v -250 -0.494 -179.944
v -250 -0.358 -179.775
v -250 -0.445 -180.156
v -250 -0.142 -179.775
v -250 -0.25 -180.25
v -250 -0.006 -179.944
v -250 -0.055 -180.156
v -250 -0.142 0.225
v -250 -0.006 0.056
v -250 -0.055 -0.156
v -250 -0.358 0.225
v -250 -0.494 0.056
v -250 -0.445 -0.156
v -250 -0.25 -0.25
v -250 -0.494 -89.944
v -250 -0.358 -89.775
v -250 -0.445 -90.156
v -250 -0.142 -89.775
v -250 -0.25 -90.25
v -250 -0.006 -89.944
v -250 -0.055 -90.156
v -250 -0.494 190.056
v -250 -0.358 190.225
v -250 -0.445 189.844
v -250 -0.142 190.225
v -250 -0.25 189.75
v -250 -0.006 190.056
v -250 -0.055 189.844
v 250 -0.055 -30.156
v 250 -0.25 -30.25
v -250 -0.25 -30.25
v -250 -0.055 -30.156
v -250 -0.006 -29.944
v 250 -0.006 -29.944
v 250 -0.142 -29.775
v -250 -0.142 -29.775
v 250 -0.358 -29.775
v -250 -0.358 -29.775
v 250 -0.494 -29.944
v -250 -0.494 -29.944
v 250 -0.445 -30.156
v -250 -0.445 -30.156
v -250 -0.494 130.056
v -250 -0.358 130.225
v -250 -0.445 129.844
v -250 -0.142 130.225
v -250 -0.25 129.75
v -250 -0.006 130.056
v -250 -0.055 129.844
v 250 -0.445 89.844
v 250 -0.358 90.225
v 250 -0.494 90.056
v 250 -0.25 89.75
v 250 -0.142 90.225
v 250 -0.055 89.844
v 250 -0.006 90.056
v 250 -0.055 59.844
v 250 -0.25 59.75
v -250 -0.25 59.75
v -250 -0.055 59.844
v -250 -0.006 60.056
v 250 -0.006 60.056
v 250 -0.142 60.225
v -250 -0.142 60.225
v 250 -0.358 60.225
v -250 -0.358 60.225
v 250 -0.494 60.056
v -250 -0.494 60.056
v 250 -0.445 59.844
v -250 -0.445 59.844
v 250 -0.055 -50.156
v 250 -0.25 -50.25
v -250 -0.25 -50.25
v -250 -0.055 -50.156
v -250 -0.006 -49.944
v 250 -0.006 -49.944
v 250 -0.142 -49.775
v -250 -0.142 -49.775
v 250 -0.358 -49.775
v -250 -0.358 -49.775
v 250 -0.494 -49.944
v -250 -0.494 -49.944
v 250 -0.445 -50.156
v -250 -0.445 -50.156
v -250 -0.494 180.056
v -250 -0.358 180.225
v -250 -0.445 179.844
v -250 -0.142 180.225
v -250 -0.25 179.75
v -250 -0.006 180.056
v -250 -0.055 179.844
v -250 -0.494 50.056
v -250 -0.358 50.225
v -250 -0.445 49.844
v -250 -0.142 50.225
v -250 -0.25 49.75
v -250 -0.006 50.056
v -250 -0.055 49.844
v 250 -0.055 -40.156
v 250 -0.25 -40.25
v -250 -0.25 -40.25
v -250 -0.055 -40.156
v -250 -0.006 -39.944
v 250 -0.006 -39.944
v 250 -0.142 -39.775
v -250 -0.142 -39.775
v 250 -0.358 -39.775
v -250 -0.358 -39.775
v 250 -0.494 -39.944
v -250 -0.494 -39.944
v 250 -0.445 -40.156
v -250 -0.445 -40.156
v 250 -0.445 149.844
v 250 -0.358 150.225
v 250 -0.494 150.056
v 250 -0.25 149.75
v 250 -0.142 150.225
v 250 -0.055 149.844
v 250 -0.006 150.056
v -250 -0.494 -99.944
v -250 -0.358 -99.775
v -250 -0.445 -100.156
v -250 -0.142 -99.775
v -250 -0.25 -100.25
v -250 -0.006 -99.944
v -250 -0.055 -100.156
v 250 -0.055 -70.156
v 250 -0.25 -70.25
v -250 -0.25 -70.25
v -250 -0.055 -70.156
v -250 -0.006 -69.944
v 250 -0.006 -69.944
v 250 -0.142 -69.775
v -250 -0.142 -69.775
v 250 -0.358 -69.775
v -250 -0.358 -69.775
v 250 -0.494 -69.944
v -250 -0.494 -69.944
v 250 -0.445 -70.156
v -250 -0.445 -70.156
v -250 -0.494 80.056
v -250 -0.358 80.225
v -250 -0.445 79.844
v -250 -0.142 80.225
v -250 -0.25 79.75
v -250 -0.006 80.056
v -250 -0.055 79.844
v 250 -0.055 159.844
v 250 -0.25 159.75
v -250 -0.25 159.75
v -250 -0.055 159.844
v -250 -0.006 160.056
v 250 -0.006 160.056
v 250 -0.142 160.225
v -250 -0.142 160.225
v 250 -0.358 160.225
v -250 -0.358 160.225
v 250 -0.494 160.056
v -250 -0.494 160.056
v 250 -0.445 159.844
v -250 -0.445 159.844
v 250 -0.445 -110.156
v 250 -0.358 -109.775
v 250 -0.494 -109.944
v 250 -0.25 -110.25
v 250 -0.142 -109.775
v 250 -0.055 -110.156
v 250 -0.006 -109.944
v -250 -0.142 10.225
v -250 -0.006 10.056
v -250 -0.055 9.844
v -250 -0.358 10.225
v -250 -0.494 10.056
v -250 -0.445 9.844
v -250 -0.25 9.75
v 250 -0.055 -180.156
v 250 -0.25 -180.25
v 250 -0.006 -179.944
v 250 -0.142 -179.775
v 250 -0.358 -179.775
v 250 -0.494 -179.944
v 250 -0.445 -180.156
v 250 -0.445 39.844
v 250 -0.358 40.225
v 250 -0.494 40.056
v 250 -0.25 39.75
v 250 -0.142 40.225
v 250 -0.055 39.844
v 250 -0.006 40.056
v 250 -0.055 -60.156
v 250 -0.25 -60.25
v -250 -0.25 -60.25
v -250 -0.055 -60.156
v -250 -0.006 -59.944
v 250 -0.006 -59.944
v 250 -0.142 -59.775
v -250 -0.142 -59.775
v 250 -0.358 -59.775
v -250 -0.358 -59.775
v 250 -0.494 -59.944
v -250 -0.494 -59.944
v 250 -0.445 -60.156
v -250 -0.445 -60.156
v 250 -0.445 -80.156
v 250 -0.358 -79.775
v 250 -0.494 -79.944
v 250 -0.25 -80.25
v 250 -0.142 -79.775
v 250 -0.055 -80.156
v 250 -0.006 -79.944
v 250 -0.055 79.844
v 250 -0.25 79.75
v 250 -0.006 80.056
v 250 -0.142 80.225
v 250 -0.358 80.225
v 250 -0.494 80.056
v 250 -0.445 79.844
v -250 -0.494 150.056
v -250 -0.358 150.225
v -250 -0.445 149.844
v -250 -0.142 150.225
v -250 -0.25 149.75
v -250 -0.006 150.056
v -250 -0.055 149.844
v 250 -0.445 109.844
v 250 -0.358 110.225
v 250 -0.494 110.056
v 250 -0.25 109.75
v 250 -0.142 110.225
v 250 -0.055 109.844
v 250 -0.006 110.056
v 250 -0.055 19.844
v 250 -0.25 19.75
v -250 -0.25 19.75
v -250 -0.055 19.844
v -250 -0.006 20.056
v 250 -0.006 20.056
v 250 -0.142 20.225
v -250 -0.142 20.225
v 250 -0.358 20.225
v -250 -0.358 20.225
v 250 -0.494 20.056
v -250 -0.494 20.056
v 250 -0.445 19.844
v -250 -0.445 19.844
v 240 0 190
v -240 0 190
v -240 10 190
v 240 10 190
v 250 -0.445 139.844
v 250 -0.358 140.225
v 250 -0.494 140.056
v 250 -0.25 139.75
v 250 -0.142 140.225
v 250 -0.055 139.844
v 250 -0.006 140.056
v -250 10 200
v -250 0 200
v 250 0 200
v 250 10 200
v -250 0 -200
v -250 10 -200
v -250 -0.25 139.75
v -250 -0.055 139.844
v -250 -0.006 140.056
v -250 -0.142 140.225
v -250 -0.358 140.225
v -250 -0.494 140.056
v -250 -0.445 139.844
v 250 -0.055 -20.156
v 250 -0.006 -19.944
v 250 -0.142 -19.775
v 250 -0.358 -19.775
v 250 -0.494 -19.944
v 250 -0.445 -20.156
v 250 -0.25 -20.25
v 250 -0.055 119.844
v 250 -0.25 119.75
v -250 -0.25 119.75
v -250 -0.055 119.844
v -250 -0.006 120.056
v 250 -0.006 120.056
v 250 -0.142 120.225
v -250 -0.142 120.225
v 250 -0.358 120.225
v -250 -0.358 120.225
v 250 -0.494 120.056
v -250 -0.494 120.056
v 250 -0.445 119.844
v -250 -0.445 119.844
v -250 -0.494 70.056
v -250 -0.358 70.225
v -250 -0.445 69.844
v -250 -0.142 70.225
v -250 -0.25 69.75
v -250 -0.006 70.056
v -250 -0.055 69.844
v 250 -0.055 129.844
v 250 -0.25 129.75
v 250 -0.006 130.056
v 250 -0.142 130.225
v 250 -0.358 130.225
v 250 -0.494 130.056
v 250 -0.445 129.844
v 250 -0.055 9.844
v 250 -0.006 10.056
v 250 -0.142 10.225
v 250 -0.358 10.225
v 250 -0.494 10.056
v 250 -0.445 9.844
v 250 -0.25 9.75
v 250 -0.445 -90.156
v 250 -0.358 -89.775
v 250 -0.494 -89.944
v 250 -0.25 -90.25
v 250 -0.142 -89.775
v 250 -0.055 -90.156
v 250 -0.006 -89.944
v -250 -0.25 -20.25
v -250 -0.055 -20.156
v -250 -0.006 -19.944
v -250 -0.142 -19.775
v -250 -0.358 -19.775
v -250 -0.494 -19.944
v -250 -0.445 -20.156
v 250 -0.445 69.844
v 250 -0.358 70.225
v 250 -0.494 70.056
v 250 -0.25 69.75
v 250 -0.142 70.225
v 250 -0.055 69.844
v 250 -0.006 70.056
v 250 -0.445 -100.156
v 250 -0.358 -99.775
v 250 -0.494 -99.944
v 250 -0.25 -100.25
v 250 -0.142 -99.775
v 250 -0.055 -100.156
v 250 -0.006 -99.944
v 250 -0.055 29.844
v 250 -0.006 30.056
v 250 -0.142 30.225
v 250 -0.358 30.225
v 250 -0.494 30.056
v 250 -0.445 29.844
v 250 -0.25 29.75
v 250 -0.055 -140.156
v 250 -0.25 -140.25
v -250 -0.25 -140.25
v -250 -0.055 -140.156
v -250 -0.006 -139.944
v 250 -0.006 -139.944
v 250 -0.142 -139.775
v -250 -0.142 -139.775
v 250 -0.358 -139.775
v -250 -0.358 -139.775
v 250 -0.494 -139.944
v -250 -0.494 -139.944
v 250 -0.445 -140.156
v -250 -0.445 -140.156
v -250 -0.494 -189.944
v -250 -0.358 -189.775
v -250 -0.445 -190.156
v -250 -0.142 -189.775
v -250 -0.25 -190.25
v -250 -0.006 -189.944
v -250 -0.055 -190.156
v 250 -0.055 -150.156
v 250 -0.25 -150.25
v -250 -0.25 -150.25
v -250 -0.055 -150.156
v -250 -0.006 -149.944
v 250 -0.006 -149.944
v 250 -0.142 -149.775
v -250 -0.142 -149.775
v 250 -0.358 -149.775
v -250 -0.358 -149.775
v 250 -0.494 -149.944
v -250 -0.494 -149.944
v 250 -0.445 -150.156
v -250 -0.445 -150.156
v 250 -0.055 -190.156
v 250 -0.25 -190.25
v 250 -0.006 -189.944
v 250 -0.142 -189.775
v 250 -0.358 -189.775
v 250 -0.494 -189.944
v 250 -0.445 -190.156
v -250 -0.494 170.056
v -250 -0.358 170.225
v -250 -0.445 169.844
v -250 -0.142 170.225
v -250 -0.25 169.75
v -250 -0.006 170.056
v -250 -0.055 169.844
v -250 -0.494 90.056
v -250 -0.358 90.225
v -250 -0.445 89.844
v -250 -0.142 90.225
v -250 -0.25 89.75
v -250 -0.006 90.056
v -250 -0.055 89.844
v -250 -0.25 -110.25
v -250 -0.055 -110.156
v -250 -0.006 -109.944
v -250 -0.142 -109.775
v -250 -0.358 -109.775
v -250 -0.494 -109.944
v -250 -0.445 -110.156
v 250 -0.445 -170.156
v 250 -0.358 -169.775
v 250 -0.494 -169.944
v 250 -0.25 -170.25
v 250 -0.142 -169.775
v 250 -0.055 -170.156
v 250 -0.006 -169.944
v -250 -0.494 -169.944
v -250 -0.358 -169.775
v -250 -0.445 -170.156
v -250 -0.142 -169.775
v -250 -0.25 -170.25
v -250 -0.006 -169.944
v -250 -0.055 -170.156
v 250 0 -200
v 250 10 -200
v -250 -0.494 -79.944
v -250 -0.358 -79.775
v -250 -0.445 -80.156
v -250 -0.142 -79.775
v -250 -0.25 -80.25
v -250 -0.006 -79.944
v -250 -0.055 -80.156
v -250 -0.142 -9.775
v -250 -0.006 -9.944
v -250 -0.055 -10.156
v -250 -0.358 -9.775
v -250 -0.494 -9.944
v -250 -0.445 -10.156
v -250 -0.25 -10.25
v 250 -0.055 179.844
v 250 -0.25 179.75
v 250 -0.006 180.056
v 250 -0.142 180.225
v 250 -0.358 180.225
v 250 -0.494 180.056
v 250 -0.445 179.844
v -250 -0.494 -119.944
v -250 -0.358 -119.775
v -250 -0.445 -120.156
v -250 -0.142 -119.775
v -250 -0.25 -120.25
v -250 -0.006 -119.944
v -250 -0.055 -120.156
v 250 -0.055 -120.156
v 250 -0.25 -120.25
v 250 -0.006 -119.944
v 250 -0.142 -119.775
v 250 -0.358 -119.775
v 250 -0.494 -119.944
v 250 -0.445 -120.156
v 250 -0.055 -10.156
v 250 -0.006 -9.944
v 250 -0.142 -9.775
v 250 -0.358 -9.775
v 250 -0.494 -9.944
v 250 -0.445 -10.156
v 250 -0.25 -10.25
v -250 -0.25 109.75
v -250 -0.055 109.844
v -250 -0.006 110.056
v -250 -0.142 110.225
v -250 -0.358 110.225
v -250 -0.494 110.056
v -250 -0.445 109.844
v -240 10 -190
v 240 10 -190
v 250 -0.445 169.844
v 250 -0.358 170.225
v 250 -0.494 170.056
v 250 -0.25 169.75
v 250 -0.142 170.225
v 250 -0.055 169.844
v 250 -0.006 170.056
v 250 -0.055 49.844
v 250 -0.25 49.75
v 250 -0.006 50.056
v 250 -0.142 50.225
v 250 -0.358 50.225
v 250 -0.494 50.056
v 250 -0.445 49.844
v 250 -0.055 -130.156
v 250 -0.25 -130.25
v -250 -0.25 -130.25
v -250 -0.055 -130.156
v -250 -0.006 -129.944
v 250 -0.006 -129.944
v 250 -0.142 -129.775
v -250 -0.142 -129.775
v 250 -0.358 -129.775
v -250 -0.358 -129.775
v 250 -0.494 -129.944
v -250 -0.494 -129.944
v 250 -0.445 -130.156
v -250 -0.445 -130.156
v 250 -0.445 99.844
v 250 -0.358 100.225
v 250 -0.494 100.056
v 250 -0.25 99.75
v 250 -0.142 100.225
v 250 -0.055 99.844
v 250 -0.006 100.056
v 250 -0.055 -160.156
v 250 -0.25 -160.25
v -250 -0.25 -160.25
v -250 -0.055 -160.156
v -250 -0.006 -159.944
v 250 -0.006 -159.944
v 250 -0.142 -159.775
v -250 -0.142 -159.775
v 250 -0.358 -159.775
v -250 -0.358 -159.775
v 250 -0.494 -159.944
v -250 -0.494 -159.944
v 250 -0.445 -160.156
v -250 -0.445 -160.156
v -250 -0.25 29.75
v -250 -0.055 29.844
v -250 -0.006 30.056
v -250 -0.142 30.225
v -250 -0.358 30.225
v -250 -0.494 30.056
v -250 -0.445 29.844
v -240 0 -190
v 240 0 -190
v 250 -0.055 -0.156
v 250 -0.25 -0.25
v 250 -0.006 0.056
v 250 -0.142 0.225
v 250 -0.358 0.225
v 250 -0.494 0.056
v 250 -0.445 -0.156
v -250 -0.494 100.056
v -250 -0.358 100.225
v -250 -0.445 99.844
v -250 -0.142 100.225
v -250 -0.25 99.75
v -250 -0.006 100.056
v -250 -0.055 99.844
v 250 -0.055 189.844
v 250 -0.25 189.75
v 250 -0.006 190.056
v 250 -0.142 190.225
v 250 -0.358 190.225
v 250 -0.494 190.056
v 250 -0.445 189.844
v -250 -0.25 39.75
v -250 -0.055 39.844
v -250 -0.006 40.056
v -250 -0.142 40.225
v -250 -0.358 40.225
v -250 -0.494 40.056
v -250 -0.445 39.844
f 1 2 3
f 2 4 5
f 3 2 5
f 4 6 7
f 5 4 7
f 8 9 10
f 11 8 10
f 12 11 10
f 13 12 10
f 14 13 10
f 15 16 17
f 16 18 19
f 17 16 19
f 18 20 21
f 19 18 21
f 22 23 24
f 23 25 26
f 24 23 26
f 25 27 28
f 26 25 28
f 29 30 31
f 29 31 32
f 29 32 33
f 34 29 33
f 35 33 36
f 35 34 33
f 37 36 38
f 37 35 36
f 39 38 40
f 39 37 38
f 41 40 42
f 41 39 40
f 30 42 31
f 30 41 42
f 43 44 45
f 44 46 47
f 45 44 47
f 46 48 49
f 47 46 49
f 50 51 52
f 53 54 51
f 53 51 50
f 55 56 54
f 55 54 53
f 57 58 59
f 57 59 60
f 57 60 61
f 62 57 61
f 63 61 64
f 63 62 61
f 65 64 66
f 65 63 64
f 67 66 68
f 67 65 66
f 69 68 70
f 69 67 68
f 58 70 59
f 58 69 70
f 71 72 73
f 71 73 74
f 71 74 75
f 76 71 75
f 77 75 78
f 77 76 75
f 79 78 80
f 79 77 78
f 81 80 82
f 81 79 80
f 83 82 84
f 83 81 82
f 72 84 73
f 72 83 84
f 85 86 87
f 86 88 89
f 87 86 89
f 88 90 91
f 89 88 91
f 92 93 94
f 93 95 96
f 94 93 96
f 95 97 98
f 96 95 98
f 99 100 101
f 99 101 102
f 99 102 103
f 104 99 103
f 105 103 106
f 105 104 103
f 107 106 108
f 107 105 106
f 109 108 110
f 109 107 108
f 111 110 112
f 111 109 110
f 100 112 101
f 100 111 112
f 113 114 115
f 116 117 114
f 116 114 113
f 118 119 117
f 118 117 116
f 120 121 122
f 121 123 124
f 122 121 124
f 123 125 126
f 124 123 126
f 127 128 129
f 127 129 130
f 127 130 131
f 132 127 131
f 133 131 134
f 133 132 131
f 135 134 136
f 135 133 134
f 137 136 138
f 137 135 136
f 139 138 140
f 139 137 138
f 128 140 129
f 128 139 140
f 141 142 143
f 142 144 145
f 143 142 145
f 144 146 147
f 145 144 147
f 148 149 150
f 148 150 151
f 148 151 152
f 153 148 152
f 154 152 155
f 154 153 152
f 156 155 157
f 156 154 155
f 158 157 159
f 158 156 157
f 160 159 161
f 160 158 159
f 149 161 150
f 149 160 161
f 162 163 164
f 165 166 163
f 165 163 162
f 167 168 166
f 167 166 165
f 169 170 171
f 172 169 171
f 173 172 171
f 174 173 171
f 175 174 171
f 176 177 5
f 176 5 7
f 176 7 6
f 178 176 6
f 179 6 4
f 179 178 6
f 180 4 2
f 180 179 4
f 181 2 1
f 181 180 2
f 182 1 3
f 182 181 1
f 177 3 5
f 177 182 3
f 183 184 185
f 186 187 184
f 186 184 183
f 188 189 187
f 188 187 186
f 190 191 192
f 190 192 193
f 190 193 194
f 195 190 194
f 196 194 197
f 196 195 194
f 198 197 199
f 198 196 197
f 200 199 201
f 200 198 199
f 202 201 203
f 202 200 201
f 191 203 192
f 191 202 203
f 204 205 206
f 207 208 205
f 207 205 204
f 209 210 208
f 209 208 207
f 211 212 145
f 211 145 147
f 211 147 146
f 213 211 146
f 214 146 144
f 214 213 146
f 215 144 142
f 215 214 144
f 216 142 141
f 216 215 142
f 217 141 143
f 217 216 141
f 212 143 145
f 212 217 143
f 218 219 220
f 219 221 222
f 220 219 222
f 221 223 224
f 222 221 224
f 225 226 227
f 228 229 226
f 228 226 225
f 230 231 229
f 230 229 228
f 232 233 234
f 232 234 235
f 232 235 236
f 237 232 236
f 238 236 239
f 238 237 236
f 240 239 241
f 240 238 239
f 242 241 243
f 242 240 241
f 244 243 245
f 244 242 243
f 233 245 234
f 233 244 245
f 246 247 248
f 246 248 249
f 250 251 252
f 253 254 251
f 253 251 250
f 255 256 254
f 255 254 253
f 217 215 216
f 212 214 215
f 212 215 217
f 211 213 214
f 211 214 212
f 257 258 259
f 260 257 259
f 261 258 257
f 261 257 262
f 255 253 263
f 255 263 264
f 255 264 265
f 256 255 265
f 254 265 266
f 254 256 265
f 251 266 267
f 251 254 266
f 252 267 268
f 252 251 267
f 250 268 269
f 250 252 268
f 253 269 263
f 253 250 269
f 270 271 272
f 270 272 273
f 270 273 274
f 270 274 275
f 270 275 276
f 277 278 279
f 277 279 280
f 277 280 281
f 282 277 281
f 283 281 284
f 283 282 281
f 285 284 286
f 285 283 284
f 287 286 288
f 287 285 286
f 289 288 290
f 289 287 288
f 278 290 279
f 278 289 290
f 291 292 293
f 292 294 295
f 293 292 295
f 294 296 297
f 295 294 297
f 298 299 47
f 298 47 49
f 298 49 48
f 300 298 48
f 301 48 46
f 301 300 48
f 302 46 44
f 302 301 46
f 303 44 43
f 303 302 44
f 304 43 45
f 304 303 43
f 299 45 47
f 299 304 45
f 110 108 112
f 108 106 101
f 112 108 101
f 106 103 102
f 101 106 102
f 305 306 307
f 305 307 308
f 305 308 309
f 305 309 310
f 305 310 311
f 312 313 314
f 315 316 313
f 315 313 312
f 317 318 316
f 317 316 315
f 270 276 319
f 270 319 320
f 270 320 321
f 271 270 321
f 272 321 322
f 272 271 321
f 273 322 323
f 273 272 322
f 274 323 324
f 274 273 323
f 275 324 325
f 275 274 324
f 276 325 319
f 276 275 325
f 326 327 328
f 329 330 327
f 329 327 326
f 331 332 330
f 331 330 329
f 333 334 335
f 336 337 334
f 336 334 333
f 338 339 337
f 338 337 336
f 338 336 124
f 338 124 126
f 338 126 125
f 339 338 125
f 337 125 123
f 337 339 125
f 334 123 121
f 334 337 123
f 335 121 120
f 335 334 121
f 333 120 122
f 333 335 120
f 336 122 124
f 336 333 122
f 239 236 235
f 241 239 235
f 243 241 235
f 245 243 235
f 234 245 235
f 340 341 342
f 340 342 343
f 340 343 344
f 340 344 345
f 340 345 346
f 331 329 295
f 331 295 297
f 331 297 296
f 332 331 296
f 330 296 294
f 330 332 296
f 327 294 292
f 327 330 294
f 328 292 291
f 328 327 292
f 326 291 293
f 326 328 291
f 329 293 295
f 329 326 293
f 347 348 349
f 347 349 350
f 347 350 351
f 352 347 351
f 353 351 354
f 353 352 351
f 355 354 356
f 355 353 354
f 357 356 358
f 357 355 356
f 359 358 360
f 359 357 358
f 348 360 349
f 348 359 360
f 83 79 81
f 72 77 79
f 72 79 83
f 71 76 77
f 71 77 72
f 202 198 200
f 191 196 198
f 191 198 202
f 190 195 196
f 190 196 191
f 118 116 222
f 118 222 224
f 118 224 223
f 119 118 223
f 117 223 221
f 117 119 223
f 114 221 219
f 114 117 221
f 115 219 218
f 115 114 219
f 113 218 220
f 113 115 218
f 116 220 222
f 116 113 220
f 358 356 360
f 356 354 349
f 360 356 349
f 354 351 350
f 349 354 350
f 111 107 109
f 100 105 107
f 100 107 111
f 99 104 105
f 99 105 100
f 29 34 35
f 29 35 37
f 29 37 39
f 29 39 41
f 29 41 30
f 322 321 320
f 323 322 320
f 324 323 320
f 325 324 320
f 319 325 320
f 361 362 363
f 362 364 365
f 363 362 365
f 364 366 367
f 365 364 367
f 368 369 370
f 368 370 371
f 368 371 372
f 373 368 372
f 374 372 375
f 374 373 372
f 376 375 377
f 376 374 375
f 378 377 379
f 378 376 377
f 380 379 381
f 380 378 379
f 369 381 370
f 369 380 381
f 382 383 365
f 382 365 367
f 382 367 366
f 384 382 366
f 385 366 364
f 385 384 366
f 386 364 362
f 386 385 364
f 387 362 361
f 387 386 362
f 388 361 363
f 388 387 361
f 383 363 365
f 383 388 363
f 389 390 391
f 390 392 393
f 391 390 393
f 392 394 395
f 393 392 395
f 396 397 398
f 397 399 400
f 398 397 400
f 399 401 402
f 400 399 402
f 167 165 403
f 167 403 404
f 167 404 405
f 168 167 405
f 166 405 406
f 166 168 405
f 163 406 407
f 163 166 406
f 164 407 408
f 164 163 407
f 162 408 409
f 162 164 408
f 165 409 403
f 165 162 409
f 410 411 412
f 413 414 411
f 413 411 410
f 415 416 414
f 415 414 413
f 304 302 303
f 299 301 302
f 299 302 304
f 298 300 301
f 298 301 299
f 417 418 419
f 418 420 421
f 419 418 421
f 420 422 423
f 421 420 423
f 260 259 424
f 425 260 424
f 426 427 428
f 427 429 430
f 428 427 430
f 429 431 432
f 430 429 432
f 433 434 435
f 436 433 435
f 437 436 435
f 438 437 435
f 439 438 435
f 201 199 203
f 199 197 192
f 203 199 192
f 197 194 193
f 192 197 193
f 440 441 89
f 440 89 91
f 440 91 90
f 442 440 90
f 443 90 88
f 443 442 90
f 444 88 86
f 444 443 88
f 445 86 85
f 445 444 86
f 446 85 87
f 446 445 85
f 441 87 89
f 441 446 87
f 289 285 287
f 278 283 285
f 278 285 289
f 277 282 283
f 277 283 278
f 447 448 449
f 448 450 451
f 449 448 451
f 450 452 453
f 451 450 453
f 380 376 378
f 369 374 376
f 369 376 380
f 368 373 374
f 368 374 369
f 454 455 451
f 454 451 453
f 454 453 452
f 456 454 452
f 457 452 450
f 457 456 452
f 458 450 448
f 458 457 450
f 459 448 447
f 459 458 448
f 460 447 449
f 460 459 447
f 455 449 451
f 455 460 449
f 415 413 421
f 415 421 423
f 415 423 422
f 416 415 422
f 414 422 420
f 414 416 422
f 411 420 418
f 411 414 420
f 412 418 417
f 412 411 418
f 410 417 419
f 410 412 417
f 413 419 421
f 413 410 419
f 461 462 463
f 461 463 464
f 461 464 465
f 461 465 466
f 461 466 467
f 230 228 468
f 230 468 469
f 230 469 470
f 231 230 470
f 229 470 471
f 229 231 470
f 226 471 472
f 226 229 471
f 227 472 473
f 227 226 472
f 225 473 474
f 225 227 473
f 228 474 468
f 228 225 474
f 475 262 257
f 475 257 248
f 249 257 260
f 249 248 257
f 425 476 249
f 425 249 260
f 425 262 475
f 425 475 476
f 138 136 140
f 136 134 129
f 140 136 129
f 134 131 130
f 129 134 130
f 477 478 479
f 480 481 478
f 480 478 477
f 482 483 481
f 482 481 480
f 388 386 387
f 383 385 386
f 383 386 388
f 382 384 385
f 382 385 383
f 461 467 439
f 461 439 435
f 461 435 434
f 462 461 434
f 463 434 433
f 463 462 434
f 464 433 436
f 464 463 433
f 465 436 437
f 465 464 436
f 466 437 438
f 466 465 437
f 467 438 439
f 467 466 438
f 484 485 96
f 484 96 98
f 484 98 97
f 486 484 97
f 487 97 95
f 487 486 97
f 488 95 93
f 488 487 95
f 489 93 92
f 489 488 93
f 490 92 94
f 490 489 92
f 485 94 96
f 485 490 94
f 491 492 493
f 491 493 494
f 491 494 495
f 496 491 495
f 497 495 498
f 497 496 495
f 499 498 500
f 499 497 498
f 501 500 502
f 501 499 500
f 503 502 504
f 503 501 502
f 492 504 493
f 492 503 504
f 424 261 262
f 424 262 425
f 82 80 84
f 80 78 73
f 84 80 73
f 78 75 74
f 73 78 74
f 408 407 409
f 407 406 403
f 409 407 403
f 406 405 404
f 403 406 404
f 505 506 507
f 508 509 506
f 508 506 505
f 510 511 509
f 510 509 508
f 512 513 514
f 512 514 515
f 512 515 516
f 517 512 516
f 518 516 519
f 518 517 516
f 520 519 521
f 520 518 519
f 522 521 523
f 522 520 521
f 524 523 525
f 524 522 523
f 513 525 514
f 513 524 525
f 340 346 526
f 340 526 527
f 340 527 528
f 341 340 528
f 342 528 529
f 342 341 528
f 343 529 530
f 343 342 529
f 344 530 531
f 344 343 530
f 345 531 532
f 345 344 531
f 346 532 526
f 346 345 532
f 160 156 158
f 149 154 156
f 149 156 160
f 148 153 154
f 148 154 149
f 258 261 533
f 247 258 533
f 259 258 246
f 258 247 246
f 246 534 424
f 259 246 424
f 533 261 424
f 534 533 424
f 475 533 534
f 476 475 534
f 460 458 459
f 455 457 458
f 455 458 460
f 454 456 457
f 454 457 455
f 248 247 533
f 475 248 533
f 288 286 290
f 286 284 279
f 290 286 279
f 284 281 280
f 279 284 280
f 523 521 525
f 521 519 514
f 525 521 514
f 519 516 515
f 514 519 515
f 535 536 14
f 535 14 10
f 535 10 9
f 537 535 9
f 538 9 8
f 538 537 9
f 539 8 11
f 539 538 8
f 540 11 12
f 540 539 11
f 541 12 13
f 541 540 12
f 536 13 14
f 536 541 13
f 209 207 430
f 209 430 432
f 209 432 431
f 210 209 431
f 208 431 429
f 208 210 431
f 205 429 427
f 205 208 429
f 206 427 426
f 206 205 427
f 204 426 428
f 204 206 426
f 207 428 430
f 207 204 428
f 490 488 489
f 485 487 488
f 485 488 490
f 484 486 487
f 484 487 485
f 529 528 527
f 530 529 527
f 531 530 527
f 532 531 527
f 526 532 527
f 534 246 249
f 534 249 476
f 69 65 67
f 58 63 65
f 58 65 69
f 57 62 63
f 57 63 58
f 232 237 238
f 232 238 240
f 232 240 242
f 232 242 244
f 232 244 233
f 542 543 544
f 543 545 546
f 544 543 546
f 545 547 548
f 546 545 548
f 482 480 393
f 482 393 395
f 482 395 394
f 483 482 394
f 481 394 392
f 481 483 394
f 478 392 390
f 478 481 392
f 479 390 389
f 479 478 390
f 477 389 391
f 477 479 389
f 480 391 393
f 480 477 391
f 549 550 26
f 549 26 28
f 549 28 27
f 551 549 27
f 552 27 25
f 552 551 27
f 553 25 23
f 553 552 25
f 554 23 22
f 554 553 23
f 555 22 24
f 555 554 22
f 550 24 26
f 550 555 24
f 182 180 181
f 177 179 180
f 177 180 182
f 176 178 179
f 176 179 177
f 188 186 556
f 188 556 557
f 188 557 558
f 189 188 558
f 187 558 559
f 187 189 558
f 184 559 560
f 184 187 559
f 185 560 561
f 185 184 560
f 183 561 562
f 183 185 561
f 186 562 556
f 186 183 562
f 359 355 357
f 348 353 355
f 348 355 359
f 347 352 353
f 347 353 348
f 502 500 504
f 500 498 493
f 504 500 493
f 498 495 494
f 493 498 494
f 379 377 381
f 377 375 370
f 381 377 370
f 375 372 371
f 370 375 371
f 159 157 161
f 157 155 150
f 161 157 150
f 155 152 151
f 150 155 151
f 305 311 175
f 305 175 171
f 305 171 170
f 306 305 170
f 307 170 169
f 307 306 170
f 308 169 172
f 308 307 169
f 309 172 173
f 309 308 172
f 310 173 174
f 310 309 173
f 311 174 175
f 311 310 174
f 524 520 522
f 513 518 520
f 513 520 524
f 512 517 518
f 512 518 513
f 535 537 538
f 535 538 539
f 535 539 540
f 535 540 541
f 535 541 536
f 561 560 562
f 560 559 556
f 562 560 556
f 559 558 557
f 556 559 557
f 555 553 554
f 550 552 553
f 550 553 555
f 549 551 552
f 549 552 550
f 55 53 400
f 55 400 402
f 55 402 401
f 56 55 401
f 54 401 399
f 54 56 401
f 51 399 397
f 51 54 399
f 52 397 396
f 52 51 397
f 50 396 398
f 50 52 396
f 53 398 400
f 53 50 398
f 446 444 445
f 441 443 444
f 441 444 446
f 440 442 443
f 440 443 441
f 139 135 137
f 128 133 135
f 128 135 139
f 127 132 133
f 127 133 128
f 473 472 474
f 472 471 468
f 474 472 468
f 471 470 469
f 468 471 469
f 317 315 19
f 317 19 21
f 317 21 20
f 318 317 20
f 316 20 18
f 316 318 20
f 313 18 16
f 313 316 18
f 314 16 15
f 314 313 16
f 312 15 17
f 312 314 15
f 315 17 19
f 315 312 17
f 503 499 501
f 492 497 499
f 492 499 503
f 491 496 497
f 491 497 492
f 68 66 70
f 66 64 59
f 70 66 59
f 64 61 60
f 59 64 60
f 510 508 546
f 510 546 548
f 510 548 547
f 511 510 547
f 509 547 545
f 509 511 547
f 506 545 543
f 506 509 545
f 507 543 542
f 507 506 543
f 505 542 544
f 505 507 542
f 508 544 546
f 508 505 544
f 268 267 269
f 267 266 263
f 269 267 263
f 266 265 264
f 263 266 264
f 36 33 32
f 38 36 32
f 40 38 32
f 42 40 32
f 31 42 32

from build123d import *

# Parameters (mm, degrees)
SKETCH1_W              = 500
SKETCH1_H              = 400
SKETCH1_W_2            = 480
SKETCH1_H_2            = 380
BOSS_EXTRUDE1_DEPTH    = 10
SKETCH3_R              = 0.25
BOSS_EXTRUDE2_DEPTH    = 500
BOSS_EXTRUDE2_2_DEPTH  = 500
BOSS_EXTRUDE2_3_DEPTH  = 500
BOSS_EXTRUDE2_4_DEPTH  = 500
BOSS_EXTRUDE2_5_DEPTH  = 500
BOSS_EXTRUDE2_6_DEPTH  = 500
BOSS_EXTRUDE2_7_DEPTH  = 500
BOSS_EXTRUDE2_8_DEPTH  = 500
BOSS_EXTRUDE2_9_DEPTH  = 500
BOSS_EXTRUDE2_10_DEPTH = 500
BOSS_EXTRUDE2_11_DEPTH = 500
BOSS_EXTRUDE2_12_DEPTH = 500
BOSS_EXTRUDE2_13_DEPTH = 500
BOSS_EXTRUDE2_14_DEPTH = 500
BOSS_EXTRUDE2_15_DEPTH = 500
BOSS_EXTRUDE2_16_DEPTH = 500
BOSS_EXTRUDE2_17_DEPTH = 500
BOSS_EXTRUDE2_18_DEPTH = 500
BOSS_EXTRUDE2_19_DEPTH = 500
BOSS_EXTRUDE2_20_DEPTH = 500
BOSS_EXTRUDE2_21_DEPTH = 500
BOSS_EXTRUDE2_22_DEPTH = 500
BOSS_EXTRUDE2_23_DEPTH = 500
BOSS_EXTRUDE2_24_DEPTH = 500
BOSS_EXTRUDE2_25_DEPTH = 500
BOSS_EXTRUDE2_26_DEPTH = 500
BOSS_EXTRUDE2_27_DEPTH = 500
BOSS_EXTRUDE2_28_DEPTH = 500
BOSS_EXTRUDE2_29_DEPTH = 500
BOSS_EXTRUDE2_30_DEPTH = 500
BOSS_EXTRUDE2_31_DEPTH = 500
BOSS_EXTRUDE2_32_DEPTH = 500
BOSS_EXTRUDE2_33_DEPTH = 500
BOSS_EXTRUDE2_34_DEPTH = 500
BOSS_EXTRUDE2_35_DEPTH = 500
BOSS_EXTRUDE2_36_DEPTH = 500
BOSS_EXTRUDE2_37_DEPTH = 500
BOSS_EXTRUDE2_38_DEPTH = 500
BOSS_EXTRUDE2_39_DEPTH = 500


with BuildPart() as part:
    # Sketch1 → Boss-Extrude1 (new body)
    with BuildSketch(Plane(origin=(0, 0, 0), x_dir=(1, 0, 0), z_dir=(0, 1, 0))):
        Rectangle(SKETCH1_W, SKETCH1_H)
        Rectangle(SKETCH1_W_2, SKETCH1_H_2, mode=Mode.SUBTRACT)
    extrude(amount=BOSS_EXTRUDE1_DEPTH)


with BuildPart() as body_2:
    # Sketch3 → Boss-Extrude2 (new body)
    with BuildSketch(Plane(origin=(250, 0, 0), x_dir=(0, 0, -1), z_dir=(1, 0, 0))):
        with Locations((0, -0.25)):
            Circle(SKETCH3_R)
    extrude(amount=-BOSS_EXTRUDE2_DEPTH)


with BuildPart() as body_3:
    # Sketch3 → Boss-Extrude2 2 (new body)
    with BuildSketch(Plane(origin=(250, 0, 0), x_dir=(0, 0, -1), z_dir=(1, 0, 0))):
        with Locations((-10, -0.25)):
            Circle(SKETCH3_R)
    extrude(amount=-BOSS_EXTRUDE2_2_DEPTH)


with BuildPart() as body_4:
    # Sketch3 → Boss-Extrude2 3 (new body)
    with BuildSketch(Plane(origin=(250, 0, 0), x_dir=(0, 0, -1), z_dir=(1, 0, 0))):
        with Locations((-20, -0.25)):
            Circle(SKETCH3_R)
    extrude(amount=-BOSS_EXTRUDE2_3_DEPTH)


with BuildPart() as body_5:
    # Sketch3 → Boss-Extrude2 4 (new body)
    with BuildSketch(Plane(origin=(250, 0, 0), x_dir=(0, 0, -1), z_dir=(1, 0, 0))):
        with Locations((-30, -0.25)):
            Circle(SKETCH3_R)
    extrude(amount=-BOSS_EXTRUDE2_4_DEPTH)


with BuildPart() as body_6:
    # Sketch3 → Boss-Extrude2 5 (new body)
    with BuildSketch(Plane(origin=(250, 0, 0), x_dir=(0, 0, -1), z_dir=(1, 0, 0))):
        with Locations((-40, -0.25)):
            Circle(SKETCH3_R)
    extrude(amount=-BOSS_EXTRUDE2_5_DEPTH)


with BuildPart() as body_7:
    # Sketch3 → Boss-Extrude2 6 (new body)
    with BuildSketch(Plane(origin=(250, 0, 0), x_dir=(0, 0, -1), z_dir=(1, 0, 0))):
        with Locations((-50, -0.25)):
            Circle(SKETCH3_R)
    extrude(amount=-BOSS_EXTRUDE2_6_DEPTH)


with BuildPart() as body_8:
    # Sketch3 → Boss-Extrude2 7 (new body)
    with BuildSketch(Plane(origin=(250, 0, 0), x_dir=(0, 0, -1), z_dir=(1, 0, 0))):
        with Locations((-60, -0.25)):
            Circle(SKETCH3_R)
    extrude(amount=-BOSS_EXTRUDE2_7_DEPTH)


with BuildPart() as body_9:
    # Sketch3 → Boss-Extrude2 8 (new body)
    with BuildSketch(Plane(origin=(250, 0, 0), x_dir=(0, 0, -1), z_dir=(1, 0, 0))):
        with Locations((-70, -0.25)):
            Circle(SKETCH3_R)
    extrude(amount=-BOSS_EXTRUDE2_8_DEPTH)


with BuildPart() as body_10:
    # Sketch3 → Boss-Extrude2 9 (new body)
    with BuildSketch(Plane(origin=(250, 0, 0), x_dir=(0, 0, -1), z_dir=(1, 0, 0))):
        with Locations((-80, -0.25)):
            Circle(SKETCH3_R)
    extrude(amount=-BOSS_EXTRUDE2_9_DEPTH)


with BuildPart() as body_11:
    # Sketch3 → Boss-Extrude2 10 (new body)
    with BuildSketch(Plane(origin=(250, 0, 0), x_dir=(0, 0, -1), z_dir=(1, 0, 0))):
        with Locations((-90, -0.25)):
            Circle(SKETCH3_R)
    extrude(amount=-BOSS_EXTRUDE2_10_DEPTH)


with BuildPart() as body_12:
    # Sketch3 → Boss-Extrude2 11 (new body)
    with BuildSketch(Plane(origin=(250, 0, 0), x_dir=(0, 0, -1), z_dir=(1, 0, 0))):
        with Locations((-100, -0.25)):
            Circle(SKETCH3_R)
    extrude(amount=-BOSS_EXTRUDE2_11_DEPTH)


with BuildPart() as body_13:
    # Sketch3 → Boss-Extrude2 12 (new body)
    with BuildSketch(Plane(origin=(250, 0, 0), x_dir=(0, 0, -1), z_dir=(1, 0, 0))):
        with Locations((-110, -0.25)):
            Circle(SKETCH3_R)
    extrude(amount=-BOSS_EXTRUDE2_12_DEPTH)


with BuildPart() as body_14:
    # Sketch3 → Boss-Extrude2 13 (new body)
    with BuildSketch(Plane(origin=(250, 0, 0), x_dir=(0, 0, -1), z_dir=(1, 0, 0))):
        with Locations((-120, -0.25)):
            Circle(SKETCH3_R)
    extrude(amount=-BOSS_EXTRUDE2_13_DEPTH)


with BuildPart() as body_15:
    # Sketch3 → Boss-Extrude2 14 (new body)
    with BuildSketch(Plane(origin=(250, 0, 0), x_dir=(0, 0, -1), z_dir=(1, 0, 0))):
        with Locations((-130, -0.25)):
            Circle(SKETCH3_R)
    extrude(amount=-BOSS_EXTRUDE2_14_DEPTH)


with BuildPart() as body_16:
    # Sketch3 → Boss-Extrude2 15 (new body)
    with BuildSketch(Plane(origin=(250, 0, 0), x_dir=(0, 0, -1), z_dir=(1, 0, 0))):
        with Locations((-140, -0.25)):
            Circle(SKETCH3_R)
    extrude(amount=-BOSS_EXTRUDE2_15_DEPTH)


with BuildPart() as body_17:
    # Sketch3 → Boss-Extrude2 16 (new body)
    with BuildSketch(Plane(origin=(250, 0, 0), x_dir=(0, 0, -1), z_dir=(1, 0, 0))):
        with Locations((-150, -0.25)):
            Circle(SKETCH3_R)
    extrude(amount=-BOSS_EXTRUDE2_16_DEPTH)


with BuildPart() as body_18:
    # Sketch3 → Boss-Extrude2 17 (new body)
    with BuildSketch(Plane(origin=(250, 0, 0), x_dir=(0, 0, -1), z_dir=(1, 0, 0))):
        with Locations((-160, -0.25)):
            Circle(SKETCH3_R)
    extrude(amount=-BOSS_EXTRUDE2_17_DEPTH)


with BuildPart() as body_19:
    # Sketch3 → Boss-Extrude2 18 (new body)
    with BuildSketch(Plane(origin=(250, 0, 0), x_dir=(0, 0, -1), z_dir=(1, 0, 0))):
        with Locations((-170, -0.25)):
            Circle(SKETCH3_R)
    extrude(amount=-BOSS_EXTRUDE2_18_DEPTH)


with BuildPart() as body_20:
    # Sketch3 → Boss-Extrude2 19 (new body)
    with BuildSketch(Plane(origin=(250, 0, 0), x_dir=(0, 0, -1), z_dir=(1, 0, 0))):
        with Locations((-180, -0.25)):
            Circle(SKETCH3_R)
    extrude(amount=-BOSS_EXTRUDE2_19_DEPTH)


with BuildPart() as body_21:
    # Sketch3 → Boss-Extrude2 20 (new body)
    with BuildSketch(Plane(origin=(250, 0, 0), x_dir=(0, 0, -1), z_dir=(1, 0, 0))):
        with Locations((-190, -0.25)):
            Circle(SKETCH3_R)
    extrude(amount=-BOSS_EXTRUDE2_20_DEPTH)


with BuildPart() as body_22:
    # Sketch3 → Boss-Extrude2 21 (new body)
    with BuildSketch(Plane(origin=(250, 0, 0), x_dir=(0, 0, -1), z_dir=(1, 0, 0))):
        with Locations((10, -0.25)):
            Circle(SKETCH3_R)
    extrude(amount=-BOSS_EXTRUDE2_21_DEPTH)


with BuildPart() as body_23:
    # Sketch3 → Boss-Extrude2 22 (new body)
    with BuildSketch(Plane(origin=(250, 0, 0), x_dir=(0, 0, -1), z_dir=(1, 0, 0))):
        with Locations((20, -0.25)):
            Circle(SKETCH3_R)
    extrude(amount=-BOSS_EXTRUDE2_22_DEPTH)


with BuildPart() as body_24:
    # Sketch3 → Boss-Extrude2 23 (new body)
    with BuildSketch(Plane(origin=(250, 0, 0), x_dir=(0, 0, -1), z_dir=(1, 0, 0))):
        with Locations((30, -0.25)):
            Circle(SKETCH3_R)
    extrude(amount=-BOSS_EXTRUDE2_23_DEPTH)


with BuildPart() as body_25:
    # Sketch3 → Boss-Extrude2 24 (new body)
    with BuildSketch(Plane(origin=(250, 0, 0), x_dir=(0, 0, -1), z_dir=(1, 0, 0))):
        with Locations((40, -0.25)):
            Circle(SKETCH3_R)
    extrude(amount=-BOSS_EXTRUDE2_24_DEPTH)


with BuildPart() as body_26:
    # Sketch3 → Boss-Extrude2 25 (new body)
    with BuildSketch(Plane(origin=(250, 0, 0), x_dir=(0, 0, -1), z_dir=(1, 0, 0))):
        with Locations((50, -0.25)):
            Circle(SKETCH3_R)
    extrude(amount=-BOSS_EXTRUDE2_25_DEPTH)


with BuildPart() as body_27:
    # Sketch3 → Boss-Extrude2 26 (new body)
    with BuildSketch(Plane(origin=(250, 0, 0), x_dir=(0, 0, -1), z_dir=(1, 0, 0))):
        with Locations((60, -0.25)):
            Circle(SKETCH3_R)
    extrude(amount=-BOSS_EXTRUDE2_26_DEPTH)


with BuildPart() as body_28:
    # Sketch3 → Boss-Extrude2 27 (new body)
    with BuildSketch(Plane(origin=(250, 0, 0), x_dir=(0, 0, -1), z_dir=(1, 0, 0))):
        with Locations((70, -0.25)):
            Circle(SKETCH3_R)
    extrude(amount=-BOSS_EXTRUDE2_27_DEPTH)


with BuildPart() as body_29:
    # Sketch3 → Boss-Extrude2 28 (new body)
    with BuildSketch(Plane(origin=(250, 0, 0), x_dir=(0, 0, -1), z_dir=(1, 0, 0))):
        with Locations((80, -0.25)):
            Circle(SKETCH3_R)
    extrude(amount=-BOSS_EXTRUDE2_28_DEPTH)


with BuildPart() as body_30:
    # Sketch3 → Boss-Extrude2 29 (new body)
    with BuildSketch(Plane(origin=(250, 0, 0), x_dir=(0, 0, -1), z_dir=(1, 0, 0))):
        with Locations((90, -0.25)):
            Circle(SKETCH3_R)
    extrude(amount=-BOSS_EXTRUDE2_29_DEPTH)


with BuildPart() as body_31:
    # Sketch3 → Boss-Extrude2 30 (new body)
    with BuildSketch(Plane(origin=(250, 0, 0), x_dir=(0, 0, -1), z_dir=(1, 0, 0))):
        with Locations((100, -0.25)):
            Circle(SKETCH3_R)
    extrude(amount=-BOSS_EXTRUDE2_30_DEPTH)


with BuildPart() as body_32:
    # Sketch3 → Boss-Extrude2 31 (new body)
    with BuildSketch(Plane(origin=(250, 0, 0), x_dir=(0, 0, -1), z_dir=(1, 0, 0))):
        with Locations((110, -0.25)):
            Circle(SKETCH3_R)
    extrude(amount=-BOSS_EXTRUDE2_31_DEPTH)


with BuildPart() as body_33:
    # Sketch3 → Boss-Extrude2 32 (new body)
    with BuildSketch(Plane(origin=(250, 0, 0), x_dir=(0, 0, -1), z_dir=(1, 0, 0))):
        with Locations((120, -0.25)):
            Circle(SKETCH3_R)
    extrude(amount=-BOSS_EXTRUDE2_32_DEPTH)


with BuildPart() as body_34:
    # Sketch3 → Boss-Extrude2 33 (new body)
    with BuildSketch(Plane(origin=(250, 0, 0), x_dir=(0, 0, -1), z_dir=(1, 0, 0))):
        with Locations((130, -0.25)):
            Circle(SKETCH3_R)
    extrude(amount=-BOSS_EXTRUDE2_33_DEPTH)


with BuildPart() as body_35:
    # Sketch3 → Boss-Extrude2 34 (new body)
    with BuildSketch(Plane(origin=(250, 0, 0), x_dir=(0, 0, -1), z_dir=(1, 0, 0))):
        with Locations((140, -0.25)):
            Circle(SKETCH3_R)
    extrude(amount=-BOSS_EXTRUDE2_34_DEPTH)


with BuildPart() as body_36:
    # Sketch3 → Boss-Extrude2 35 (new body)
    with BuildSketch(Plane(origin=(250, 0, 0), x_dir=(0, 0, -1), z_dir=(1, 0, 0))):
        with Locations((150, -0.25)):
            Circle(SKETCH3_R)
    extrude(amount=-BOSS_EXTRUDE2_35_DEPTH)


with BuildPart() as body_37:
    # Sketch3 → Boss-Extrude2 36 (new body)
    with BuildSketch(Plane(origin=(250, 0, 0), x_dir=(0, 0, -1), z_dir=(1, 0, 0))):
        with Locations((160, -0.25)):
            Circle(SKETCH3_R)
    extrude(amount=-BOSS_EXTRUDE2_36_DEPTH)


with BuildPart() as body_38:
    # Sketch3 → Boss-Extrude2 37 (new body)
    with BuildSketch(Plane(origin=(250, 0, 0), x_dir=(0, 0, -1), z_dir=(1, 0, 0))):
        with Locations((170, -0.25)):
            Circle(SKETCH3_R)
    extrude(amount=-BOSS_EXTRUDE2_37_DEPTH)


with BuildPart() as body_39:
    # Sketch3 → Boss-Extrude2 38 (new body)
    with BuildSketch(Plane(origin=(250, 0, 0), x_dir=(0, 0, -1), z_dir=(1, 0, 0))):
        with Locations((180, -0.25)):
            Circle(SKETCH3_R)
    extrude(amount=-BOSS_EXTRUDE2_38_DEPTH)


with BuildPart() as body_40:
    # Sketch3 → Boss-Extrude2 39 (new body)
    with BuildSketch(Plane(origin=(250, 0, 0), x_dir=(0, 0, -1), z_dir=(1, 0, 0))):
        with Locations((190, -0.25)):
            Circle(SKETCH3_R)
    extrude(amount=-BOSS_EXTRUDE2_39_DEPTH)


solid = Compound([part.part, body_2.part, body_3.part, body_4.part, body_5.part, body_6.part, body_7.part, body_8.part, body_9.part, body_10.part, body_11.part, body_12.part, body_13.part, body_14.part, body_15.part, body_16.part, body_17.part, body_18.part, body_19.part, body_20.part, body_21.part, body_22.part, body_23.part, body_24.part, body_25.part, body_26.part, body_27.part, body_28.part, body_29.part, body_30.part, body_31.part, body_32.part, body_33.part, body_34.part, body_35.part, body_36.part, body_37.part, body_38.part, body_39.part, body_40.part])
